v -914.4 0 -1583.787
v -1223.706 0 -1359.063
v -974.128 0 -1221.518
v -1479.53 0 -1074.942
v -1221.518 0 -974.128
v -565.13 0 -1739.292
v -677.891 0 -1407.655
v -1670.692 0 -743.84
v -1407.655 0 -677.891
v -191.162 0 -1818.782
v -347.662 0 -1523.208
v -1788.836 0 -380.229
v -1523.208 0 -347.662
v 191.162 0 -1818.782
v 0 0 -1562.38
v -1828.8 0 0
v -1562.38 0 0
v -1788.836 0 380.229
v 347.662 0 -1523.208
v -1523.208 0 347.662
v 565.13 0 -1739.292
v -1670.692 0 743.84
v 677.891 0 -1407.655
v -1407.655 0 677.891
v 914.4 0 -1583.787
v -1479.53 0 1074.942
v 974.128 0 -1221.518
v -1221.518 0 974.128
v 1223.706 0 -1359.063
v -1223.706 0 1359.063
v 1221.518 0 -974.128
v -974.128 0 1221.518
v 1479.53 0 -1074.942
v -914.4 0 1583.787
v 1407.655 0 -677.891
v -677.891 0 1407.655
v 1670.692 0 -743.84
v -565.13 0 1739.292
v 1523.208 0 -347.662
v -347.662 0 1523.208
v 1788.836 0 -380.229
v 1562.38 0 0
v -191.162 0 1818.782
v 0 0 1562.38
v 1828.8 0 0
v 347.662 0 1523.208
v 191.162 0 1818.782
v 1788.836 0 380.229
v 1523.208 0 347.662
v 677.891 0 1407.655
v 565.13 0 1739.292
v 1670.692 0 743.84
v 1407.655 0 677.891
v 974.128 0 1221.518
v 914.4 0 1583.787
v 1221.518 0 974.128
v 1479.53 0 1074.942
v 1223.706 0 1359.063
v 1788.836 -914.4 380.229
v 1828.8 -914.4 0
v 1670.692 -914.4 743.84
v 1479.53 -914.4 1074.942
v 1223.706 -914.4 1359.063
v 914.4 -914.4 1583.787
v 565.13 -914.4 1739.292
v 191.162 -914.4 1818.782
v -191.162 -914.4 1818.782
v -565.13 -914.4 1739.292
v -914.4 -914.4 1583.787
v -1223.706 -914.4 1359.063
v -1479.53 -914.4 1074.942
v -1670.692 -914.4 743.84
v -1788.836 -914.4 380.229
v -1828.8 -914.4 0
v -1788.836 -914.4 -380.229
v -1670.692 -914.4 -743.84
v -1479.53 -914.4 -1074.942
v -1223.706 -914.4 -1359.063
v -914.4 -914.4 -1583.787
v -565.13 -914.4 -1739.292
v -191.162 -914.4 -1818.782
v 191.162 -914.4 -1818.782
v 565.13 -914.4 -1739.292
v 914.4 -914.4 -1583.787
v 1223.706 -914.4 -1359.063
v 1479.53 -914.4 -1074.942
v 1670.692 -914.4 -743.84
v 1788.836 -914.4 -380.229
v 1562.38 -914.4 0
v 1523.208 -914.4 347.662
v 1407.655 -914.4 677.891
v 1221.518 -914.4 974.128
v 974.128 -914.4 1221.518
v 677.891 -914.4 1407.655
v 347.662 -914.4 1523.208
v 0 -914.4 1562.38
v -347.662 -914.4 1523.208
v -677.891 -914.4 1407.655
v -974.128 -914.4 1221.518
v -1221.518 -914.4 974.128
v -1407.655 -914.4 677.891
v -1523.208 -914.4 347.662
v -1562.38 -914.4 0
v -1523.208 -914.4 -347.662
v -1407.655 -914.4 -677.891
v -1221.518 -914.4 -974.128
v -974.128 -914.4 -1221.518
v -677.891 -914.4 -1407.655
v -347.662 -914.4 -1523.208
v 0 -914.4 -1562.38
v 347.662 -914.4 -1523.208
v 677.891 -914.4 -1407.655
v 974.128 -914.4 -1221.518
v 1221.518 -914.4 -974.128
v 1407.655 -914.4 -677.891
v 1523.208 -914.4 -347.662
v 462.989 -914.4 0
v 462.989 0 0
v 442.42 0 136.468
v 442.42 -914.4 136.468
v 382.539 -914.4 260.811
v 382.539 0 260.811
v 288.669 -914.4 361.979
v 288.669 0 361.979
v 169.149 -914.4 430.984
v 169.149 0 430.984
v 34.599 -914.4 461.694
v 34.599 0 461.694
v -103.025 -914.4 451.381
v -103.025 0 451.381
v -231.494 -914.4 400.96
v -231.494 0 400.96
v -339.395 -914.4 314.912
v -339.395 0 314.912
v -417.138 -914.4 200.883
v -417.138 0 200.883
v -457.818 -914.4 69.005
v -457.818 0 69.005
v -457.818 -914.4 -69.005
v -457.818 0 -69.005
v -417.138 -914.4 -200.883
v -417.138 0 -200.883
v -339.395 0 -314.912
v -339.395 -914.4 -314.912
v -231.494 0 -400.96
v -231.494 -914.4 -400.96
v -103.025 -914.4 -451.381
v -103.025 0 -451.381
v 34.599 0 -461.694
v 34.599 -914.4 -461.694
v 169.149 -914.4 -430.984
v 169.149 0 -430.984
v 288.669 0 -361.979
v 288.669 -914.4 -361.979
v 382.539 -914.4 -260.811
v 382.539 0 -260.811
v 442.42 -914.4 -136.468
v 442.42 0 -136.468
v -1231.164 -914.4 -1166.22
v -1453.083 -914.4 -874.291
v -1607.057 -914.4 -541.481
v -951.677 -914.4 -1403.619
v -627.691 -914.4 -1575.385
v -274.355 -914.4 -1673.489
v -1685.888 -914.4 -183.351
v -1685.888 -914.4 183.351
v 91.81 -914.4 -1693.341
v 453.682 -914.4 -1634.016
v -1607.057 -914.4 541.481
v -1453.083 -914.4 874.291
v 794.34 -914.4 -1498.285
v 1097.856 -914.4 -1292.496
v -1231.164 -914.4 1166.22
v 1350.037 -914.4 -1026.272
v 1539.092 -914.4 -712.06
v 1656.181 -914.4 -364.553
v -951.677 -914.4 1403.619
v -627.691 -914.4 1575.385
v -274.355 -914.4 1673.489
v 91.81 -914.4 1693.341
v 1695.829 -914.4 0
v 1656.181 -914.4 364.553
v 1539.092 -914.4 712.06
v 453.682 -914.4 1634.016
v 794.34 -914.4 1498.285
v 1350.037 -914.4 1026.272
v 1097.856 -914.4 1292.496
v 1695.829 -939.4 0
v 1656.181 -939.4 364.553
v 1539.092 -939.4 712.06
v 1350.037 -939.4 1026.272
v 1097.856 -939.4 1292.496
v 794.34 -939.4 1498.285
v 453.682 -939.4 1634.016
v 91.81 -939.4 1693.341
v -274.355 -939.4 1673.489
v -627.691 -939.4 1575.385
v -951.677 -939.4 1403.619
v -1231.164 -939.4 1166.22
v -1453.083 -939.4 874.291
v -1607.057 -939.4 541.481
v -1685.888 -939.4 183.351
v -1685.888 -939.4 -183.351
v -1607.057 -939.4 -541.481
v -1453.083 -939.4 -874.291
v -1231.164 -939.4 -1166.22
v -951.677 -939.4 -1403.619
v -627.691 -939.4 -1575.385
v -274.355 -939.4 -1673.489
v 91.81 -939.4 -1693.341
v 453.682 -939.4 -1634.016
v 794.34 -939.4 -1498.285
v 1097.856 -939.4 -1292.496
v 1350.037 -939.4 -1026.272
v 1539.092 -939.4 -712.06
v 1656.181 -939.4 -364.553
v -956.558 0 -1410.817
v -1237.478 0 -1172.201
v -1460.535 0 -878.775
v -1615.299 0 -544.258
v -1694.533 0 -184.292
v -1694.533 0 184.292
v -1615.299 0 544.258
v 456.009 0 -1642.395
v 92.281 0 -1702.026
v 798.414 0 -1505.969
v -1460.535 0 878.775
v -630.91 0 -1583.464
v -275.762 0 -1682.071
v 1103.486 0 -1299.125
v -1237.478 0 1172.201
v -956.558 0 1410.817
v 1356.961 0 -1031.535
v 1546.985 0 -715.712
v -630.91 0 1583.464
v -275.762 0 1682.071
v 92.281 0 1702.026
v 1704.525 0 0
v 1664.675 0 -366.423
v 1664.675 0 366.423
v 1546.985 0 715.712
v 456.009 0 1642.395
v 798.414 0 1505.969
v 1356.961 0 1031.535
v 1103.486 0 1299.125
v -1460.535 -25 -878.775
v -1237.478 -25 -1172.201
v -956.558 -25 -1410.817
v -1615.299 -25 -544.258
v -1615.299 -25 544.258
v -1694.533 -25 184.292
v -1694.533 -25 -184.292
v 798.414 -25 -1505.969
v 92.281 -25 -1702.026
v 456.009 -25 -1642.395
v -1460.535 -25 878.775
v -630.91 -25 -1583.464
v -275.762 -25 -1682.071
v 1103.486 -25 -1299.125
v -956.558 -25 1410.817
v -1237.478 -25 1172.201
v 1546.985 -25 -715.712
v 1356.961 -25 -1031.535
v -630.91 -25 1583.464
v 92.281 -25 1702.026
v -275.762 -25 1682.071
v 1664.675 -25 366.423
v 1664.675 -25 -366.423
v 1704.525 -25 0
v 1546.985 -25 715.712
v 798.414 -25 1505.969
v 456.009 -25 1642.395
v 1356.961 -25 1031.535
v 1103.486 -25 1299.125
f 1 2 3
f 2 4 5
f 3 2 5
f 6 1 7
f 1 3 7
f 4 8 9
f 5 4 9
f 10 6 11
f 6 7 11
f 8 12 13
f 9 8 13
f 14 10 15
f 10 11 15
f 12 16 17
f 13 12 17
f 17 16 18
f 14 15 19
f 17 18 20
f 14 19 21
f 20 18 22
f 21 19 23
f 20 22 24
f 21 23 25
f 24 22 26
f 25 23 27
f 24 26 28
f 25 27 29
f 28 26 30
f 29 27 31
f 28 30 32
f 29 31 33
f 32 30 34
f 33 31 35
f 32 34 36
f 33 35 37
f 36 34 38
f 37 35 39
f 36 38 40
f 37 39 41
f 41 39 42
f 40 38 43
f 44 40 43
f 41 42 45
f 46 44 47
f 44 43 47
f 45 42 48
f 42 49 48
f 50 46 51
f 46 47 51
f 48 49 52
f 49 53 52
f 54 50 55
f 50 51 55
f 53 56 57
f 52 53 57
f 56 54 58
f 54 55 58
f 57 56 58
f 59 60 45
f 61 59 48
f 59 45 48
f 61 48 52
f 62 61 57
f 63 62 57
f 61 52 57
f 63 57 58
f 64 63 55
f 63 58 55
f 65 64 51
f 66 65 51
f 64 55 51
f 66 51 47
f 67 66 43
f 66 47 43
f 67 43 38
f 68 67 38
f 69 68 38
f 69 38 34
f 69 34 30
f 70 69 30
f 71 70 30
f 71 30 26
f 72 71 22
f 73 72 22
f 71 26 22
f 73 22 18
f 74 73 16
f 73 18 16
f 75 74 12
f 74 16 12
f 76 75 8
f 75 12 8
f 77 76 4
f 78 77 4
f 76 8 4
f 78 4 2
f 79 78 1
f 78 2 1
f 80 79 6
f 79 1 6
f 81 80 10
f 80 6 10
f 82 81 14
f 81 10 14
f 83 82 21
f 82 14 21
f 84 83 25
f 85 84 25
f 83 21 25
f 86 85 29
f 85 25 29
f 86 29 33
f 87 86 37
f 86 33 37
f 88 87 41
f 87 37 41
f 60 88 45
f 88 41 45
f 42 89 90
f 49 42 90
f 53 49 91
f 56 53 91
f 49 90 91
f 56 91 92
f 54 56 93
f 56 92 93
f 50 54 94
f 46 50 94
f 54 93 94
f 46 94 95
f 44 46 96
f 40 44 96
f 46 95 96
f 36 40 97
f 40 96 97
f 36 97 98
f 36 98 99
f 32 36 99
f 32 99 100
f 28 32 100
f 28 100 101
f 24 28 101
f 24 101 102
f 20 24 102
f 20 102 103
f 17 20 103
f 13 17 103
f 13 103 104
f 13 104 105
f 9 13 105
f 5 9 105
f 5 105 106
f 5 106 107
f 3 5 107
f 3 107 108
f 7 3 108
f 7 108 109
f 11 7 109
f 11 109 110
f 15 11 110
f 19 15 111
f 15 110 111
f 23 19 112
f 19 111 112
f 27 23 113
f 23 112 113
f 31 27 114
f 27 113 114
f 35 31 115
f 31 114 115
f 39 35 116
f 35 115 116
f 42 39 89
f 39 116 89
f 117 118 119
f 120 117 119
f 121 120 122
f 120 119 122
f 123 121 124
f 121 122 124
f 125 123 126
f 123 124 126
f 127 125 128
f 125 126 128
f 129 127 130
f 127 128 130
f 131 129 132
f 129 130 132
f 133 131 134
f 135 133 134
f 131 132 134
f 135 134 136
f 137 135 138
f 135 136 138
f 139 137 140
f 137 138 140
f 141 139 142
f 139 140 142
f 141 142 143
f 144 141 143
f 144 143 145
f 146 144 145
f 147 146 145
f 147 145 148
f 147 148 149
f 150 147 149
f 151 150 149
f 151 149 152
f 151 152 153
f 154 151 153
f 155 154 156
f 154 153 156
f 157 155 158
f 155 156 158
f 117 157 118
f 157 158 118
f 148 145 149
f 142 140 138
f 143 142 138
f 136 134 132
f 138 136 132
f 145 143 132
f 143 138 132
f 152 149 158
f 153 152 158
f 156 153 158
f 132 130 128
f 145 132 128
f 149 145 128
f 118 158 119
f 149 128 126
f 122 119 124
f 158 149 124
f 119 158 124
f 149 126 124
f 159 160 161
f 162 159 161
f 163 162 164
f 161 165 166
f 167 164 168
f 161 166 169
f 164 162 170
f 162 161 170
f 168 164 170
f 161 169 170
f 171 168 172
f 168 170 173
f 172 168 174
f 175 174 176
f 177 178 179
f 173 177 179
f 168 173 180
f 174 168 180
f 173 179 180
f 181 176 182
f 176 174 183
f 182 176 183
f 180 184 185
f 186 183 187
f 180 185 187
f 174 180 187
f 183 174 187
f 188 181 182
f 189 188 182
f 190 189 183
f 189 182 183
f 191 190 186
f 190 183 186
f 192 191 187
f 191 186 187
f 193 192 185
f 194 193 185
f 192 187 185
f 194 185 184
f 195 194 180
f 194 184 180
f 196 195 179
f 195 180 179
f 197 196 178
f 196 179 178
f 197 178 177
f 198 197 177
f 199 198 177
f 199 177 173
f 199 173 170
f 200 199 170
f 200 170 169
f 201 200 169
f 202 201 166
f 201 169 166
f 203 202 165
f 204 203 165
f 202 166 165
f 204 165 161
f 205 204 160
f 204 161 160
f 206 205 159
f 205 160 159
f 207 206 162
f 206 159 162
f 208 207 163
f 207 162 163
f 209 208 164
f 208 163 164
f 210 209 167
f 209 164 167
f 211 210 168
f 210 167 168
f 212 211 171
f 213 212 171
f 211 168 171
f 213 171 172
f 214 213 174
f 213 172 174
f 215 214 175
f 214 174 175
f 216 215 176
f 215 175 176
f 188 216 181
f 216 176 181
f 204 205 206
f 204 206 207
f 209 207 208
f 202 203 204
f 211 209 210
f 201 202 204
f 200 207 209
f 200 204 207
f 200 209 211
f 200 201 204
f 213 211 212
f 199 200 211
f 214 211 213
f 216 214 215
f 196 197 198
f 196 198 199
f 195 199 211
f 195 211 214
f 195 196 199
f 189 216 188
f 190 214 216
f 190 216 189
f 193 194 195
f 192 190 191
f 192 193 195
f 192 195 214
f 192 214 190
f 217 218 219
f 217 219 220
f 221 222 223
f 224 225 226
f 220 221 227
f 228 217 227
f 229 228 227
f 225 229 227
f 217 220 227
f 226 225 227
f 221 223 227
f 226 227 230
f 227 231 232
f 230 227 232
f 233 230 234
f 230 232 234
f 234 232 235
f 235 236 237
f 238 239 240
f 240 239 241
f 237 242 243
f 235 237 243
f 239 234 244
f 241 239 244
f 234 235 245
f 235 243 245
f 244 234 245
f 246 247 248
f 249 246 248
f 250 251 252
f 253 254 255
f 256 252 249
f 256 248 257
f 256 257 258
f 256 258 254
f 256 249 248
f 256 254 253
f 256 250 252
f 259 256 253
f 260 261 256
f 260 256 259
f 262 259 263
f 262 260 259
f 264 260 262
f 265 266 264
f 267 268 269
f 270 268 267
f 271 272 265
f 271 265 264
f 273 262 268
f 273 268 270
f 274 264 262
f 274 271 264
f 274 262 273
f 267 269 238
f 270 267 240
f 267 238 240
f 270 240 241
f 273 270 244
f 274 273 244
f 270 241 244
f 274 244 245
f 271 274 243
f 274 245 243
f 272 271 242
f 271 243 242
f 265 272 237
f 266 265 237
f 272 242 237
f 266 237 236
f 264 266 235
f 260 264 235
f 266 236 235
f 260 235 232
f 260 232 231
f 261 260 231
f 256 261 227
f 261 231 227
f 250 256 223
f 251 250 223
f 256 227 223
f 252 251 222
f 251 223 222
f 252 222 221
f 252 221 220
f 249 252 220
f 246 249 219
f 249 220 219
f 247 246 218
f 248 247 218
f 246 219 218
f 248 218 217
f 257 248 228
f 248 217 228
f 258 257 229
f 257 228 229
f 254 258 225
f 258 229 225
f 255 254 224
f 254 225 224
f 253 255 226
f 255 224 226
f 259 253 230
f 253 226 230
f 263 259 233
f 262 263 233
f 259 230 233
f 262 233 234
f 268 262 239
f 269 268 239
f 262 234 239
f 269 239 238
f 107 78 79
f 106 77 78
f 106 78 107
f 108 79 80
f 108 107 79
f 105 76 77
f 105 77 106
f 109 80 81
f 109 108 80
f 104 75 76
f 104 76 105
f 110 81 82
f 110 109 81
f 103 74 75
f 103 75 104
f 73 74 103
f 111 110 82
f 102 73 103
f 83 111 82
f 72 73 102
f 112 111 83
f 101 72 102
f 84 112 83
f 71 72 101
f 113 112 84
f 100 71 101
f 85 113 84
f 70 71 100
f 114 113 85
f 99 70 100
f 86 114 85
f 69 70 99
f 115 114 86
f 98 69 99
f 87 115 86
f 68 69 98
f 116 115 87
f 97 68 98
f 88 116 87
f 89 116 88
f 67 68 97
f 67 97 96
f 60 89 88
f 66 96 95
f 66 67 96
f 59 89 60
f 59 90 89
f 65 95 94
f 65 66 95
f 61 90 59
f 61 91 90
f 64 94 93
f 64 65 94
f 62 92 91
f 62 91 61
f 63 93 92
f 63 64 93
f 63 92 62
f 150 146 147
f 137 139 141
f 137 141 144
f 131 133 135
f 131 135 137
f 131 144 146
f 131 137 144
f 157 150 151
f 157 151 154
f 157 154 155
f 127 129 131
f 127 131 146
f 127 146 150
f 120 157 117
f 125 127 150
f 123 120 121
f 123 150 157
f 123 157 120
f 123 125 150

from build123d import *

# Parameters (mm, degrees)
F1_R      = 1828.8
F2_DEPTH  = 914.4
F3_R      = 1562.379676
F4_DEPTH  = 914.401
F5_R      = 462.988805
F6_DEPTH  = 914.4
F7_R      = 1695.828524
F8_DEPTH  = 25
F9_R      = 1704.525382
F10_DEPTH = 25


with BuildPart() as f2:
    # F1 (on face) → F2 (new body)
    with BuildSketch(Plane.XZ):
        Circle(F1_R)
    extrude(amount=F2_DEPTH)

    # F3 (on face) → F4 (cut, through all)
    with BuildSketch(Plane.XZ.offset(914.4)):
        Circle(F3_R)
    extrude(amount=-F4_DEPTH, mode=Mode.SUBTRACT)


with BuildPart() as f6:
    # F5 (on face) → F6 (new body)
    with BuildSketch(Plane.XZ):
        Circle(F5_R)
    extrude(amount=F6_DEPTH)


with BuildPart() as f8:
    # F7 (on face) → F8 (new body)
    with BuildSketch(Plane.XZ.offset(914.4)):
        Circle(F7_R)
    extrude(amount=F8_DEPTH)


with BuildPart() as f10:
    # F9 (on face) → F10 (new body)
    with BuildSketch(Plane.XZ):
        Circle(F9_R)
    extrude(amount=F10_DEPTH)


solid = Compound([f2.part, f6.part, f8.part, f10.part])
